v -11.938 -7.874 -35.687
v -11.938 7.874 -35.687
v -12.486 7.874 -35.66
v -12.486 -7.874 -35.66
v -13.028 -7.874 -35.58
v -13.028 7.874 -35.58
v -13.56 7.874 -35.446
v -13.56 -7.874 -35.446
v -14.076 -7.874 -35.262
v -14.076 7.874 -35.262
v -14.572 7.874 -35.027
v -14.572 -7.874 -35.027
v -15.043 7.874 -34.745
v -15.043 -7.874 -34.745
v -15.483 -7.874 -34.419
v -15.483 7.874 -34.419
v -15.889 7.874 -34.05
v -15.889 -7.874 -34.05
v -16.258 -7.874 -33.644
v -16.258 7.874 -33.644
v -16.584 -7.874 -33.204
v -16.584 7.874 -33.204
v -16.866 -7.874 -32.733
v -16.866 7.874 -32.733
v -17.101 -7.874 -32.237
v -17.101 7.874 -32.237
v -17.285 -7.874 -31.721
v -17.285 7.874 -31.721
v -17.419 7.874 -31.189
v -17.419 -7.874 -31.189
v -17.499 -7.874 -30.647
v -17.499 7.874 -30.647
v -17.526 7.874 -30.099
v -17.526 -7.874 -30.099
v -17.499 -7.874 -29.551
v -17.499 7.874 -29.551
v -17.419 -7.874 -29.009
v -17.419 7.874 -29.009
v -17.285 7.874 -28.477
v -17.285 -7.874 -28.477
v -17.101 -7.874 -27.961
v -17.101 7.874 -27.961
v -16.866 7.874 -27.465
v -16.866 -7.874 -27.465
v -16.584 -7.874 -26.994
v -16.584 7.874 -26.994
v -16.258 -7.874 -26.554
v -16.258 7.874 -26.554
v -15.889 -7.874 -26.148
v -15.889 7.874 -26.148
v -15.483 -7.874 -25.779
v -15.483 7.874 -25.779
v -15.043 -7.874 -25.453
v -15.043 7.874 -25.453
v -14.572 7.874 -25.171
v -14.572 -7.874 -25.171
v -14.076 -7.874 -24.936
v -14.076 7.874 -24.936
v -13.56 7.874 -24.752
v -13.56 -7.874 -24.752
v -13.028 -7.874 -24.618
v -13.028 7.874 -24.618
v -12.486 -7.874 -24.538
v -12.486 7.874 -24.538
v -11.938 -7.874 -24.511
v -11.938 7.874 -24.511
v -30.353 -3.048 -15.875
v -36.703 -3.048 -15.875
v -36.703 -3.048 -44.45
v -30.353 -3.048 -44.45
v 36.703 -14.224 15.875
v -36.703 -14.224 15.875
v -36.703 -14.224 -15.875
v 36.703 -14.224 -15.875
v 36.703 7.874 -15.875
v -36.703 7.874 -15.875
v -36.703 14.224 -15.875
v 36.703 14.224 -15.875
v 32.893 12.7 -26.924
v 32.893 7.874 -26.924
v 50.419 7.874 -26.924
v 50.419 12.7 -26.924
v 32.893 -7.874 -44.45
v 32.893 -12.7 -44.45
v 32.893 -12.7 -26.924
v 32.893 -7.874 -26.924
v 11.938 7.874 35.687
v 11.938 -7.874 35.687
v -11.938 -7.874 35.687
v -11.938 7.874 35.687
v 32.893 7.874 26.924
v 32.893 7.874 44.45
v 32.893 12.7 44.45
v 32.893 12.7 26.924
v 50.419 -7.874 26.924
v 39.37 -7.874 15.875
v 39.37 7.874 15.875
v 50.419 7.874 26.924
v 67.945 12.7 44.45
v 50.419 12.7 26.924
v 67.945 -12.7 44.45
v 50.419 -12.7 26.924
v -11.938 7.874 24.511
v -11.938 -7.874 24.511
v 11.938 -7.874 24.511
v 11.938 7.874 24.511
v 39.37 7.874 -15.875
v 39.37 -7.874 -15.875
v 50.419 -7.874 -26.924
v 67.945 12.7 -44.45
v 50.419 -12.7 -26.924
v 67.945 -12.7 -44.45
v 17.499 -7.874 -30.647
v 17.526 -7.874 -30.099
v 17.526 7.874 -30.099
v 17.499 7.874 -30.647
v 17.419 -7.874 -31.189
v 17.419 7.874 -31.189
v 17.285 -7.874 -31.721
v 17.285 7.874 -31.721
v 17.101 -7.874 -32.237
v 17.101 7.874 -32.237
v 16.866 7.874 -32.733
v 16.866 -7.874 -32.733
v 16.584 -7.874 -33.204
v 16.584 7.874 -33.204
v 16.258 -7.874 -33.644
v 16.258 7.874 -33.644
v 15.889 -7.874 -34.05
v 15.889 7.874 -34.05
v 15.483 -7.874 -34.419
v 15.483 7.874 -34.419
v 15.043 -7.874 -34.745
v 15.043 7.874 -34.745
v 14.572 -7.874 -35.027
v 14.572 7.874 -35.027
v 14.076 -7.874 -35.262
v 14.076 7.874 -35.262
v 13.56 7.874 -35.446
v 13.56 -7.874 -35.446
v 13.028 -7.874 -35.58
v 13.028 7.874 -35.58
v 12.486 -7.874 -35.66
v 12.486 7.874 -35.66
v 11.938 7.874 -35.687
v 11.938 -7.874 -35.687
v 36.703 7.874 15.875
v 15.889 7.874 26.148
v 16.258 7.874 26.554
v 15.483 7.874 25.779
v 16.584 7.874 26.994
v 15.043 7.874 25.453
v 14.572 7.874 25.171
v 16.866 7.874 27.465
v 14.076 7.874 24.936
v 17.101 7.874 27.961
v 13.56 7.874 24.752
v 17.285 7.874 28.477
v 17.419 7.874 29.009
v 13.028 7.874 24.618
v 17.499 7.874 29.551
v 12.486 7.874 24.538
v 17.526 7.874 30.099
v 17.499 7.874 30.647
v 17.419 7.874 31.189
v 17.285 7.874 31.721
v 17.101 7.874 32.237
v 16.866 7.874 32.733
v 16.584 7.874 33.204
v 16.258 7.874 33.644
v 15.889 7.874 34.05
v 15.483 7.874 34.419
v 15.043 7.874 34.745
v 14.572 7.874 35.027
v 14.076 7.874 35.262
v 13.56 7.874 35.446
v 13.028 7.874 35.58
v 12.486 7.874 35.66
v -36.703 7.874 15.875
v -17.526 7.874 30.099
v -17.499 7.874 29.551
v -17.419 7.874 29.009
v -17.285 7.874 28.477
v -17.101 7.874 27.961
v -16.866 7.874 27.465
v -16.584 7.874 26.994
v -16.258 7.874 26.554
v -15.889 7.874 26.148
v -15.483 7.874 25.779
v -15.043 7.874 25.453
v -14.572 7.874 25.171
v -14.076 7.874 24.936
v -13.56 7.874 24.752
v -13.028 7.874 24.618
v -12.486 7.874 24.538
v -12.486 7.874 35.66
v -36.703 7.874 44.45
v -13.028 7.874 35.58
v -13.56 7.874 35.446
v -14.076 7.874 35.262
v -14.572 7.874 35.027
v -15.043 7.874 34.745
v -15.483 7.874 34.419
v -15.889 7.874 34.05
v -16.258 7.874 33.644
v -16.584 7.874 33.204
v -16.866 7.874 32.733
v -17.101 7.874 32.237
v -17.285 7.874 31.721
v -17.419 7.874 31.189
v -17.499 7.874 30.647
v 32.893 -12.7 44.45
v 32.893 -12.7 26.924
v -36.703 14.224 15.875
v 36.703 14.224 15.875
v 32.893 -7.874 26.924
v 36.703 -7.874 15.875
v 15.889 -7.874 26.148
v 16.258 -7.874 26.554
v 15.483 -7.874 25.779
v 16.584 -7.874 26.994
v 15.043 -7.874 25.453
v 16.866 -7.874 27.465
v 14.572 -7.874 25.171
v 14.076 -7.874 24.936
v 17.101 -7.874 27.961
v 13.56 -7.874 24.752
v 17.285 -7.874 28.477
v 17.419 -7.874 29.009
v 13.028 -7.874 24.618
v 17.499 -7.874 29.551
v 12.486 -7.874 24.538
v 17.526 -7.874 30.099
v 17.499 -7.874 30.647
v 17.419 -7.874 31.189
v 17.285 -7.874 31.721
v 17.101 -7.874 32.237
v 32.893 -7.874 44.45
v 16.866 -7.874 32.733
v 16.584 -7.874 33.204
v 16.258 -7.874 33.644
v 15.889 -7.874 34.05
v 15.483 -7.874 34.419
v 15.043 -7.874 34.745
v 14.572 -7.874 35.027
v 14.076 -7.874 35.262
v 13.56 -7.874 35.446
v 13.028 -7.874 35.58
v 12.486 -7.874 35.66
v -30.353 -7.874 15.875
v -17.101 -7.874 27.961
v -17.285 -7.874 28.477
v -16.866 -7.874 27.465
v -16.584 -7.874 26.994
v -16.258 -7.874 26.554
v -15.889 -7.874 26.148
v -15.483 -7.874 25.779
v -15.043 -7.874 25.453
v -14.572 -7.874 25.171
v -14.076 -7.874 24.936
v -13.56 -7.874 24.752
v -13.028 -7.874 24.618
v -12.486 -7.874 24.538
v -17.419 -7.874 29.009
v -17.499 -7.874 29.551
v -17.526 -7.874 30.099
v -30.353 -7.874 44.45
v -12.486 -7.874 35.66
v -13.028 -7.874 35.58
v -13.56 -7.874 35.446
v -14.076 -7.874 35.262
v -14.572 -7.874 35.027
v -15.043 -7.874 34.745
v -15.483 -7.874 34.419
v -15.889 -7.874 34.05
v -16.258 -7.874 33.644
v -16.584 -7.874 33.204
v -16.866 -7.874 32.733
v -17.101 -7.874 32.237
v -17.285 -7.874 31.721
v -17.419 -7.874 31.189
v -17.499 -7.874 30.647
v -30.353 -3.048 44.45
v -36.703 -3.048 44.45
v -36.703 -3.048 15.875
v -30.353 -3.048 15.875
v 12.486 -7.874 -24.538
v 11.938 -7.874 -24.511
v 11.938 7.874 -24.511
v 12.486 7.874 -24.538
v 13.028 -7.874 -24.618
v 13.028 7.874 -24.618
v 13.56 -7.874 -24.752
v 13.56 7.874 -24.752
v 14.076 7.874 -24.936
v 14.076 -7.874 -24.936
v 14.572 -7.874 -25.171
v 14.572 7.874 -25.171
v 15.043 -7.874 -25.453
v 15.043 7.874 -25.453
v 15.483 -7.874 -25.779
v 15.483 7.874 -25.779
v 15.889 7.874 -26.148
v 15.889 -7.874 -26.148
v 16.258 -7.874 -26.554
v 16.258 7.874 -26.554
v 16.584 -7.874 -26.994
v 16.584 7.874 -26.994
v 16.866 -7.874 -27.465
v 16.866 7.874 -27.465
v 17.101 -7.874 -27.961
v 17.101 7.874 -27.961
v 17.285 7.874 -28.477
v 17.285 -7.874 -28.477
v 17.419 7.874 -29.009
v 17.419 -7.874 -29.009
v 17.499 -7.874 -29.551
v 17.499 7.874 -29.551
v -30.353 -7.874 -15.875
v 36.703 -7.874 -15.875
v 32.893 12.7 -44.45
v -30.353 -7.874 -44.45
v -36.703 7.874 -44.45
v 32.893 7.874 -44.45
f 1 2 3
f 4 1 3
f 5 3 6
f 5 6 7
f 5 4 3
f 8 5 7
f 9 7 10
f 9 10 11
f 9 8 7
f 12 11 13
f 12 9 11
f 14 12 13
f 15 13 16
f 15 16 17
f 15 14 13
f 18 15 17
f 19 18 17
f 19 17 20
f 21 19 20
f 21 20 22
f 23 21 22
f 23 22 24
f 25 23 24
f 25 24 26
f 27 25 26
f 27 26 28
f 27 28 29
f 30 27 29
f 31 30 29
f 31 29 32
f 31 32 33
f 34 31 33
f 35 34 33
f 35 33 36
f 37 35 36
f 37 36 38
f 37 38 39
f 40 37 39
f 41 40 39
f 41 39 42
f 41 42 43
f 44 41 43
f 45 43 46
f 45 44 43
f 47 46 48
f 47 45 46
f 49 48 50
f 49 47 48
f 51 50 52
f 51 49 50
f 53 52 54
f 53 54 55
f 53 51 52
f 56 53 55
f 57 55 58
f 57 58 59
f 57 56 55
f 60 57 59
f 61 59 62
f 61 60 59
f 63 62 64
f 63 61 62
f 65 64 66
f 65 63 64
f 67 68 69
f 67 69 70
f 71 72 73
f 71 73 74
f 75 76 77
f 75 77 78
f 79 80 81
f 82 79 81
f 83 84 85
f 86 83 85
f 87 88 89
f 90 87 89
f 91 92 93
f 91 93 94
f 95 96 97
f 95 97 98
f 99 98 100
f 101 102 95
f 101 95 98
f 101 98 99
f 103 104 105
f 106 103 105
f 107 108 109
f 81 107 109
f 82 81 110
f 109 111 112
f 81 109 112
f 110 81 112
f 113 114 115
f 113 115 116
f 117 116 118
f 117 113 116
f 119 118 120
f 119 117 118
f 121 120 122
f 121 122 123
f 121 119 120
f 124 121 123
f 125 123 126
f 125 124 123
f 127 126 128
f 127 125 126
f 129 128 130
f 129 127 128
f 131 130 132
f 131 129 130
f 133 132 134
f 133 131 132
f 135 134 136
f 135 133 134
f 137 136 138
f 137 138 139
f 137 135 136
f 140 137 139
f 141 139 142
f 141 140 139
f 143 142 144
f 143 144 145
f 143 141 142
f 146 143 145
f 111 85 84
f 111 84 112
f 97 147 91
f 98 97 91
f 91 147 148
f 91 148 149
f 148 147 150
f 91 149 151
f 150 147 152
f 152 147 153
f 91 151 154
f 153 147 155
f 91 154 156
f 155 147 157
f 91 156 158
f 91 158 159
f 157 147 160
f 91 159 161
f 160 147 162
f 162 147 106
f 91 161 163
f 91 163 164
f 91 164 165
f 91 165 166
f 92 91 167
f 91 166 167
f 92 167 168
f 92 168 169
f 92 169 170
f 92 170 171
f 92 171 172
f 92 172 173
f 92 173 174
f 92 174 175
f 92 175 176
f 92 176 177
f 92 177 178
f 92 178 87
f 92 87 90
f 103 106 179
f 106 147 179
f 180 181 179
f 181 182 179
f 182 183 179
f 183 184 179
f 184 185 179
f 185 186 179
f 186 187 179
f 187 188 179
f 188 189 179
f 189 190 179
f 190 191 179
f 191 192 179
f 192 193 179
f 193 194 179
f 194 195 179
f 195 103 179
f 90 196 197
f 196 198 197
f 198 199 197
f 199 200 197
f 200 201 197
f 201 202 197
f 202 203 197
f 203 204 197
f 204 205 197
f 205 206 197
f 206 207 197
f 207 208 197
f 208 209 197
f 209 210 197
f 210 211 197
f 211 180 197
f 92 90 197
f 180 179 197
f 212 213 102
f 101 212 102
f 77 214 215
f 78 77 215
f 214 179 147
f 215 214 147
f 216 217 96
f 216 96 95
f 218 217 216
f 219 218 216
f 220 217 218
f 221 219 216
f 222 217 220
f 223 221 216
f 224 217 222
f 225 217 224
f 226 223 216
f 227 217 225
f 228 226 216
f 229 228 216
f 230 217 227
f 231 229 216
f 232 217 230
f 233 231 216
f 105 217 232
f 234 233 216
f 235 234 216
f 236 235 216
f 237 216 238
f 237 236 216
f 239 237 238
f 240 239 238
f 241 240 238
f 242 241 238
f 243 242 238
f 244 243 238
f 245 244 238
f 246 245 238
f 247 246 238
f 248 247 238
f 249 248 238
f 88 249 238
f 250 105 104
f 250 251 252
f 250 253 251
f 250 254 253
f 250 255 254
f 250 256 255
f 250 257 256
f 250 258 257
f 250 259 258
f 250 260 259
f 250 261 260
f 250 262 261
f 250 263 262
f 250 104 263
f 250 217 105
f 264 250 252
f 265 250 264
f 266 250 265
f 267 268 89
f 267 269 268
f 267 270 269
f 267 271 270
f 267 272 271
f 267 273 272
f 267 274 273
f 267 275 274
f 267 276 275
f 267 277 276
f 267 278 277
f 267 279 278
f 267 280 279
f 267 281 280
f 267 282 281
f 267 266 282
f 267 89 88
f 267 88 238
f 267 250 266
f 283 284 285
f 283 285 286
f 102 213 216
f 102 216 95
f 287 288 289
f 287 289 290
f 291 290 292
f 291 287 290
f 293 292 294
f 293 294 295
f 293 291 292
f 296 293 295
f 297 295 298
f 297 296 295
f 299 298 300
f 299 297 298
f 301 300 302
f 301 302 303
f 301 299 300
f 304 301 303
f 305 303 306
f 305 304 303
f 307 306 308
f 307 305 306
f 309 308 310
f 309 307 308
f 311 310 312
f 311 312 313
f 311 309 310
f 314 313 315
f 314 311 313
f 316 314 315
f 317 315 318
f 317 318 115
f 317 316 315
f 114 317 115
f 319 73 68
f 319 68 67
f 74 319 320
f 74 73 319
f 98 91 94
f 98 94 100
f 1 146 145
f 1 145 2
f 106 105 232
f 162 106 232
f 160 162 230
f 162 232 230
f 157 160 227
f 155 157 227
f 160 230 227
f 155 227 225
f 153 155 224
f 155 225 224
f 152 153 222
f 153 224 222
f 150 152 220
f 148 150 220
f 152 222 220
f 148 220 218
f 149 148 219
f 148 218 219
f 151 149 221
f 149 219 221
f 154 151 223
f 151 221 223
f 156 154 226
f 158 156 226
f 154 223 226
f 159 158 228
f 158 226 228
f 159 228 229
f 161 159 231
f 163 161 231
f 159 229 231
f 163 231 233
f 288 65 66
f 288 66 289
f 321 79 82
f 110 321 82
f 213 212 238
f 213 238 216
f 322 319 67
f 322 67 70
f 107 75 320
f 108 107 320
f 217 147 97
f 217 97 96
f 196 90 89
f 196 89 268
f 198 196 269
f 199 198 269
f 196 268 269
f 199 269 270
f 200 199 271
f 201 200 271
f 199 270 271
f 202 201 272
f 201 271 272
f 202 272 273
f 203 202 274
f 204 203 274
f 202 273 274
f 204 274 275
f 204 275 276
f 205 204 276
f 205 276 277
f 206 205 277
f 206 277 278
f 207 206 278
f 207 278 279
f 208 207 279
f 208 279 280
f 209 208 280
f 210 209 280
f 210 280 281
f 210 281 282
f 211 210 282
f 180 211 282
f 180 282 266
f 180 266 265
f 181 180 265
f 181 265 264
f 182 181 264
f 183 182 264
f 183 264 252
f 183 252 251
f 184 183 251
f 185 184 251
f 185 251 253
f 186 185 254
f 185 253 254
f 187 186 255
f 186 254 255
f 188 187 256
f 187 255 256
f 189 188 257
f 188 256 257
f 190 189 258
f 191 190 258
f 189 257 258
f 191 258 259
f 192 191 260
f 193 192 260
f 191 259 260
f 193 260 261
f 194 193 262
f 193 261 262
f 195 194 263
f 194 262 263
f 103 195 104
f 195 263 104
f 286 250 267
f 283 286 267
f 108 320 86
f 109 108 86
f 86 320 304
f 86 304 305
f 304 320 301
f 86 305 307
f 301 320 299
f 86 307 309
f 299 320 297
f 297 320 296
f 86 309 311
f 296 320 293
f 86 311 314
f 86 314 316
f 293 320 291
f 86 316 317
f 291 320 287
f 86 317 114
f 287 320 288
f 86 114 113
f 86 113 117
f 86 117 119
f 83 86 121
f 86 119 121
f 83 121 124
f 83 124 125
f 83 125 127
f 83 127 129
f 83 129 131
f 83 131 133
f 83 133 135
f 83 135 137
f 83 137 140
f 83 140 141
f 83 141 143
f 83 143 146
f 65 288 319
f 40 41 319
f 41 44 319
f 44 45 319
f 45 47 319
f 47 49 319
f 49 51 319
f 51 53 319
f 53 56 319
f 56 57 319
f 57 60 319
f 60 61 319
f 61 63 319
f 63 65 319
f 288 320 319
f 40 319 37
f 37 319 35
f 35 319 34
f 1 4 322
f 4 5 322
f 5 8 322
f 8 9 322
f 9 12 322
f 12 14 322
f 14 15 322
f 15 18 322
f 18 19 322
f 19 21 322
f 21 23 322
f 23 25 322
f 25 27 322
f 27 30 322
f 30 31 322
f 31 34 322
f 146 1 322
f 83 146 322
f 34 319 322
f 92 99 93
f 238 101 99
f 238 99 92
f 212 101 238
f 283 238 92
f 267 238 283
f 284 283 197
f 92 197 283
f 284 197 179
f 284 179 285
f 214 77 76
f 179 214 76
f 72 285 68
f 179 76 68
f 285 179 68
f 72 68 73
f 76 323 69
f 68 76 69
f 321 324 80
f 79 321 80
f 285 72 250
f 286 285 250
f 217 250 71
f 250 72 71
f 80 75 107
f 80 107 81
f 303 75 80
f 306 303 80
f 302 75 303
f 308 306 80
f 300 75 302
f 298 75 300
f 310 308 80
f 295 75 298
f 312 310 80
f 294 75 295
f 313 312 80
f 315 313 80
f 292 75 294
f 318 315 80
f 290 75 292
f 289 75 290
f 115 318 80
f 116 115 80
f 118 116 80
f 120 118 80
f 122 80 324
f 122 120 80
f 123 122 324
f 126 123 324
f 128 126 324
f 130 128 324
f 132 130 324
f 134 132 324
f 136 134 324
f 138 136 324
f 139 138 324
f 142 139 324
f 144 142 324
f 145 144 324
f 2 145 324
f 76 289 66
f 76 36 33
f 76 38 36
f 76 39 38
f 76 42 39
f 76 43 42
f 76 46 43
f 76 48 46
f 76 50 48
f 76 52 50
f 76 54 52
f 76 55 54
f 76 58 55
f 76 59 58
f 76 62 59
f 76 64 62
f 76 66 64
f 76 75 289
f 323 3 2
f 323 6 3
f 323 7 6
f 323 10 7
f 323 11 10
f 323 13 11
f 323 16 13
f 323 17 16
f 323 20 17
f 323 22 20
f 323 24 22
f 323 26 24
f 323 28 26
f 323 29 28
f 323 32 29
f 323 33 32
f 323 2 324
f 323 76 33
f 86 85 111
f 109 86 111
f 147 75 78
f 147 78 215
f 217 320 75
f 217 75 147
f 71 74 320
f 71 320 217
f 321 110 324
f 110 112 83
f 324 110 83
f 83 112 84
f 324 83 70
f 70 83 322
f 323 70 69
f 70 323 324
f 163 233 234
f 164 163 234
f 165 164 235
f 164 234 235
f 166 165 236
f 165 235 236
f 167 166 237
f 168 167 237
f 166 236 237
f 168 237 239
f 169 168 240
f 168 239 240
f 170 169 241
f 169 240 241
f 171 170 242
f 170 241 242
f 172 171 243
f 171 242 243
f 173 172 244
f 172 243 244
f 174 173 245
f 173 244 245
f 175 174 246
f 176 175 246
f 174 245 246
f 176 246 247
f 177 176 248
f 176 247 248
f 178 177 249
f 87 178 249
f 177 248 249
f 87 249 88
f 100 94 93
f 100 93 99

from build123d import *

# Parameters (mm, degrees)
F0_W      = 73.406
F0_H      = 31.75
F1_DEPTH  = 14.224
F2_W      = 15.748
F2_H      = 28.575
F3_DEPTH  = 104.648
F5_DEPTH  = 22.099
F7_DEPTH  = 12.7
F8_W      = 6.35
F8_H      = 28.575
F9_DEPTH  = 4.826
F11_DEPTH = 22.099


with BuildPart() as f1:
    # F0 (on Front) → F1 (new body, symmetric)
    with BuildSketch(Plane.XZ):
        Rectangle(F0_W, F0_H)
    extrude(amount=F1_DEPTH, both=True)

    # F2 (on face) → F3 (join)
    with BuildSketch(Plane(origin=(-36.703, 0, 0), x_dir=(0, -1, 0), z_dir=(-1, 0, 0))):
        with Locations((0, 30.1625)):
            Rectangle(F2_W, F2_H)
    extrude(amount=-F3_DEPTH)

    # F4 (on face) → F5 (cut, through all)
    with BuildSketch(Plane.XZ.offset(7.874)):
        Polygon((67.945, 15.875), (67.945, 44.45), (39.37, 15.875), align=None)
    extrude(amount=-F5_DEPTH, mode=Mode.SUBTRACT)

    # F6 (on Front) → F7 (join, symmetric)
    with BuildSketch(Plane.XZ):
        Polygon((50.419, 26.924), (67.945, 44.45), (32.893, 44.45), (32.893, 26.924), align=None)
    extrude(amount=F7_DEPTH, both=True)

    # F8 (on face) → F9 (cut)
    with BuildSketch(Plane.XZ.offset(7.874)):
        with Locations((-33.528, 30.1625)):
            Rectangle(F8_W, F8_H)
    extrude(amount=-F9_DEPTH, mode=Mode.SUBTRACT)

    # F10 (on face) → F11 (cut, through all)
    with BuildSketch(Plane.XZ.offset(7.874)):
        with BuildLine():
            Line((-11.938, 24.511), (11.938, 24.511))
            ThreePointArc((11.938, 24.511), (6.35, 30.099), (11.938, 35.687))
            Line((11.938, 35.687), (-11.938, 35.687))
            ThreePointArc((-11.938, 35.687), (-7.986687, 34.050313), (-6.35, 30.099))
            ThreePointArc((-6.35, 30.099), (-7.986687, 26.147687), (-11.938, 24.511))
        make_face()
        with BuildLine():
            ThreePointArc((11.938, 35.687), (6.35, 30.099), (11.938, 24.511))
            ThreePointArc((11.938, 24.511), (15.889313, 26.147687), (17.526, 30.099))
            ThreePointArc((17.526, 30.099), (15.889313, 34.050313), (11.938, 35.687))
        make_face()
        with BuildLine():
            ThreePointArc((-11.938, 35.687), (-17.526, 30.099), (-11.938, 24.511))
            ThreePointArc((-11.938, 24.511), (-7.986687, 26.147687), (-6.35, 30.099))
            ThreePointArc((-6.35, 30.099), (-7.986687, 34.050313), (-11.938, 35.687))
        make_face()
    extrude(amount=-F11_DEPTH, mode=Mode.SUBTRACT)

    # F12: F1 across plane


with BuildPart() as f1_1:
    add(f1.part)
    add(f1.part.mirror(Plane.XY))


solid = f1_1.part
